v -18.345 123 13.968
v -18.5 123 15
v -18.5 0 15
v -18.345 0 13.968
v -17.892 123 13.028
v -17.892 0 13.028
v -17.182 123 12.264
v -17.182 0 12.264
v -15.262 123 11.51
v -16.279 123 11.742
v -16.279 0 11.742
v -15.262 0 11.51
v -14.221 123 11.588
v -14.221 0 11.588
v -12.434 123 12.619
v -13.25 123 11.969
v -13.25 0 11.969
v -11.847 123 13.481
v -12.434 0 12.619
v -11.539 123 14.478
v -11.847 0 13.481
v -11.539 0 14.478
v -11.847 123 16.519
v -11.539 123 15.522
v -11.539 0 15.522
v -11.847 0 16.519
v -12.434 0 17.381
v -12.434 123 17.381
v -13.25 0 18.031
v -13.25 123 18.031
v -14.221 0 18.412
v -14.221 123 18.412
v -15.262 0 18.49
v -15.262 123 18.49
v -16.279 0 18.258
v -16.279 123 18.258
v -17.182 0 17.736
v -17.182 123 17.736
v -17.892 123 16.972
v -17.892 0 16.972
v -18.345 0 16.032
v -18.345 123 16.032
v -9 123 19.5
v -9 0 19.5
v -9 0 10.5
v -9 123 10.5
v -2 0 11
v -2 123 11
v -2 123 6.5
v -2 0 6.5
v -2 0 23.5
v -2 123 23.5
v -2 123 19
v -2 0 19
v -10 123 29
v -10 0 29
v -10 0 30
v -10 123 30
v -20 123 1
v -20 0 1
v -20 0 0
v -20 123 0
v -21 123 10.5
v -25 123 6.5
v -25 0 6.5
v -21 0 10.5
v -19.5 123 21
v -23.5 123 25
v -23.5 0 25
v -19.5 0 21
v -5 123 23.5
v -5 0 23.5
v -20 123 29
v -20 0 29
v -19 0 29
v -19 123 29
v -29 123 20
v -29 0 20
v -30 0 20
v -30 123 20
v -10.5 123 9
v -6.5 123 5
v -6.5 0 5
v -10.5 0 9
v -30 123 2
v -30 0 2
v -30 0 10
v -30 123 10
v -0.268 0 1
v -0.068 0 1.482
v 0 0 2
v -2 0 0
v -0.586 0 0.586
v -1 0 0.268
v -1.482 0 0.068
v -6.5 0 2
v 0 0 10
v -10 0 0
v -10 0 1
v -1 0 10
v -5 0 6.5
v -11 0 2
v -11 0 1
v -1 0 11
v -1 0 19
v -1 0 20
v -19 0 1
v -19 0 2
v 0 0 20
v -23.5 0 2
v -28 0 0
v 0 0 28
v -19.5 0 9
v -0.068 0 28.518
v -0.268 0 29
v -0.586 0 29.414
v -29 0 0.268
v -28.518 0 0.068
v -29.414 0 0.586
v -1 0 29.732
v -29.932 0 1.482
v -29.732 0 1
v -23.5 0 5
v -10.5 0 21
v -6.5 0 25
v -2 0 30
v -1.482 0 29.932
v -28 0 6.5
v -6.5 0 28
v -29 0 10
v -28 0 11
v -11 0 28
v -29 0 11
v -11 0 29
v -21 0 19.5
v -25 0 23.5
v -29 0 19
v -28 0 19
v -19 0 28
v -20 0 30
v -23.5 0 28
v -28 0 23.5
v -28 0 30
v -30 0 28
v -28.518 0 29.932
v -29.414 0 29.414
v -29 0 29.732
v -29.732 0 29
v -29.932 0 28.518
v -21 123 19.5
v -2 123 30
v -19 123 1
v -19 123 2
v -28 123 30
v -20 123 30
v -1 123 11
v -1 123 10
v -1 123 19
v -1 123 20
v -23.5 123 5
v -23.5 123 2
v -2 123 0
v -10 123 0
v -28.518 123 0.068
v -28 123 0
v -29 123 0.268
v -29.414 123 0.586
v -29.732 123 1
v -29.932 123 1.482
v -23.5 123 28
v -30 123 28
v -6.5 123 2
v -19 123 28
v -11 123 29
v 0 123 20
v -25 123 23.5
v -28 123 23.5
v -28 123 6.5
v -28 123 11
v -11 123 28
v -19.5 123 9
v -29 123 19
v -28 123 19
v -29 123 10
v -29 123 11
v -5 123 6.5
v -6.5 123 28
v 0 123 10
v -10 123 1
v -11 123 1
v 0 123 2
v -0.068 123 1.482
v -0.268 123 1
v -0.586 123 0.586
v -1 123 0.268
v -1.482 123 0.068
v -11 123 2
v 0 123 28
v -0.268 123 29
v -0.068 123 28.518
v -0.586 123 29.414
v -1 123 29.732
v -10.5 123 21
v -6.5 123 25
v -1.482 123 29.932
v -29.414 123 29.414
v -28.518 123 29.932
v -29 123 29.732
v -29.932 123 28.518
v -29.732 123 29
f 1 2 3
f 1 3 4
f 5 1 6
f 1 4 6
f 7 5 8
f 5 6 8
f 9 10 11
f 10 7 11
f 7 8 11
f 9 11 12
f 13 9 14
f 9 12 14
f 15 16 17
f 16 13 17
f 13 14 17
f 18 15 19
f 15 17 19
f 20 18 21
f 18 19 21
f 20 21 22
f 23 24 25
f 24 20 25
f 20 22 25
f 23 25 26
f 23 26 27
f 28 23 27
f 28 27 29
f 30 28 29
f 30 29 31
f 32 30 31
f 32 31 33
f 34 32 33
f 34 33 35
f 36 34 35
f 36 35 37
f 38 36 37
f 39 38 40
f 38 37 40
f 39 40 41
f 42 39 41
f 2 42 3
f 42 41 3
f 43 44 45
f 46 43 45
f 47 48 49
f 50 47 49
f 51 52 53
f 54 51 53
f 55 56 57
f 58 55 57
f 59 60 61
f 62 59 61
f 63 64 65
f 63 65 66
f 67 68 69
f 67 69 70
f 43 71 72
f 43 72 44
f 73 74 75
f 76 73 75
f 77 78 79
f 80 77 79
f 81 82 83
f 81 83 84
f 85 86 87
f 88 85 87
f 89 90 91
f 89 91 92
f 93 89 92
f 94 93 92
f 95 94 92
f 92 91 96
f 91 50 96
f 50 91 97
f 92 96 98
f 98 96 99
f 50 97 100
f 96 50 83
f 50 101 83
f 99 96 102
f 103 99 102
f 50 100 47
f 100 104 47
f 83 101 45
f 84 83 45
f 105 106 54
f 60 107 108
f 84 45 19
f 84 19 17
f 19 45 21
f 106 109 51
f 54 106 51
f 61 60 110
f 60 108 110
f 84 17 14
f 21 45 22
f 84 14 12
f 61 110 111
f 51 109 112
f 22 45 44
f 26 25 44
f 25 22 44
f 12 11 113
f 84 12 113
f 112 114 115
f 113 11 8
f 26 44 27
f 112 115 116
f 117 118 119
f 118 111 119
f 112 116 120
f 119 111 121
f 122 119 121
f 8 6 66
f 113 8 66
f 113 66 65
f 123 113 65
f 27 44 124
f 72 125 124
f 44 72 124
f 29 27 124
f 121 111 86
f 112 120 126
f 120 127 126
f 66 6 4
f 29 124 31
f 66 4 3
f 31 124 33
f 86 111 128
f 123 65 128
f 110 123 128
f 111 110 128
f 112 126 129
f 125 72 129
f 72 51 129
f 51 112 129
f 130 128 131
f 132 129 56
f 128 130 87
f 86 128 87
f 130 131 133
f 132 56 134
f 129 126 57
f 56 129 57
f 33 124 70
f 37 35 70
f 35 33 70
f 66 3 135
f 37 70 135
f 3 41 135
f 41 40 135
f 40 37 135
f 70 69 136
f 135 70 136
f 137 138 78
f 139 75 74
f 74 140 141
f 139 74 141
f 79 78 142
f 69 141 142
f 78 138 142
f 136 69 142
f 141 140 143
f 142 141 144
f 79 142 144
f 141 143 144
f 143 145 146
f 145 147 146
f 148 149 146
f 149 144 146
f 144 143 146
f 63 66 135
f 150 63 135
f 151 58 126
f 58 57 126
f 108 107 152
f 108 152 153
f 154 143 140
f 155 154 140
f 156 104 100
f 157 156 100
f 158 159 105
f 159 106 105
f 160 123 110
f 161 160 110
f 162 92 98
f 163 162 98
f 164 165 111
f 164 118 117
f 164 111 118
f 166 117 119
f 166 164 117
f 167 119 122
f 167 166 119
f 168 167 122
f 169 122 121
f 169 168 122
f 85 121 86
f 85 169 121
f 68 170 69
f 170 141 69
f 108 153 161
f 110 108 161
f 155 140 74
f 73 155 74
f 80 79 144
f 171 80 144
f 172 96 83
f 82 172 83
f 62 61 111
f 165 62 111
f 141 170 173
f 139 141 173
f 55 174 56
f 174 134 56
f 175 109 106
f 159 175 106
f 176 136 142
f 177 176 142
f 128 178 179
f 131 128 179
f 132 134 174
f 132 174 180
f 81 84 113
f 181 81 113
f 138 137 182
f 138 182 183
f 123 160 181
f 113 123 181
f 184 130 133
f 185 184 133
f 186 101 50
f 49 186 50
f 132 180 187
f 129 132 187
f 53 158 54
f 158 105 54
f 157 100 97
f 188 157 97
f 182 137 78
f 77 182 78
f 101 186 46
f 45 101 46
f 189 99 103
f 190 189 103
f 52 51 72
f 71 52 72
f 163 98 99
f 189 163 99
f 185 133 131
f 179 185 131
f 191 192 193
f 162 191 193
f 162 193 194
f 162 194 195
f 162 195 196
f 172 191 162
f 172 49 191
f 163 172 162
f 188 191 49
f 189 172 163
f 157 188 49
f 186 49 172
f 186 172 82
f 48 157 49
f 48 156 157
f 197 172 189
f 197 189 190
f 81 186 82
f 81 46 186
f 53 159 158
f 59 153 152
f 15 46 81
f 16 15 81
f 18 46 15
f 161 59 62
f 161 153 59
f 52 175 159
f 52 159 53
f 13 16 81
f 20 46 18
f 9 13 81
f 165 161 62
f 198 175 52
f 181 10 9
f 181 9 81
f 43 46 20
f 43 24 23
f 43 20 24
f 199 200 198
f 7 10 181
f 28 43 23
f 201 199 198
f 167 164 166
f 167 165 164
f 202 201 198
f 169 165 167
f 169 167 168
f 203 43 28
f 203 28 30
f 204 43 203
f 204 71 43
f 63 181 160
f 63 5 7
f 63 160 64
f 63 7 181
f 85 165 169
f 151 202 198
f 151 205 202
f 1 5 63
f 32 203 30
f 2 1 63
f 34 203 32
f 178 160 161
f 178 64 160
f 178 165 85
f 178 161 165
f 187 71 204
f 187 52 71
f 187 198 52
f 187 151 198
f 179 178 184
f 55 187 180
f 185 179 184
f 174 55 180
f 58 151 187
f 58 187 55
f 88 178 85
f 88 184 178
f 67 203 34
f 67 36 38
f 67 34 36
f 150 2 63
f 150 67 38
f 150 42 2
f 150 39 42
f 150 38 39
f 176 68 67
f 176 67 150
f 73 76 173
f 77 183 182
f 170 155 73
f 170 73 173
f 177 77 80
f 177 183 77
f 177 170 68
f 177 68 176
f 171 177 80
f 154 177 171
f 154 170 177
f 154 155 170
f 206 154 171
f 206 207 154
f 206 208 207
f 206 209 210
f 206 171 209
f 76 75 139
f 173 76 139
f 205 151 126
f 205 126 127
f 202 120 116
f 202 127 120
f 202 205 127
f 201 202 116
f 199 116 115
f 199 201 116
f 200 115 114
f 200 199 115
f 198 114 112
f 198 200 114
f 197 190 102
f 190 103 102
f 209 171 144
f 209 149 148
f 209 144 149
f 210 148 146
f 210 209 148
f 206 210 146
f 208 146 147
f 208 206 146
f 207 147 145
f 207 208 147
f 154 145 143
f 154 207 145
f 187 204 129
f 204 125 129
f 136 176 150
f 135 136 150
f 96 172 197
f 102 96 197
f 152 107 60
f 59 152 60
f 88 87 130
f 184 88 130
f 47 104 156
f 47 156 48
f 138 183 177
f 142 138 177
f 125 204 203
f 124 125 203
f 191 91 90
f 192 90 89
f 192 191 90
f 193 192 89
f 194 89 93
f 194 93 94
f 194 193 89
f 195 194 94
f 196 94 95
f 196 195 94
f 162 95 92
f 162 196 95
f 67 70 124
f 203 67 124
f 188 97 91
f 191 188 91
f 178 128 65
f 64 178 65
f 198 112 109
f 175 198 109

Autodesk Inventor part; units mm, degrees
ref_plane "YZ Plane" through (0, 0, 0) normal (1, 0, 0) x (0, 1, 0)
ref_plane "XZ Plane" through (0, 0, 0) normal (0, 1, 0) x (-1, 0, 0)
ref_plane "XY Plane" through (0, 0, 0) normal (0, 0, 1) x (1, 0, 0)
sketch "Skizze2" plane through (0, 0, 0) normal (0, 1, 0) x (-1, 0, 0)
  line L0 (0, 0) -> (30, 0)
  line L1 (30, 0) -> (30, 30)
  line L2 (30, 30) -> (0, 30)
  line L3 (0, 30) -> (0, 0)
  line L4 (28, 28) -> (2, 28)
  line L5 (2, 28) -> (2, 2)
  line L6 (2, 2) -> (28, 2)
  line L7 (28, 2) -> (28, 28)
  line L8 (19, 30) -> (19, 28)
  line L9 (11, 30) -> (11, 28)
  line L10 (23.5, 28) -> (23.5, 25)
  line L11 (19.5, 21) -> (10.5, 21)
  line L12 (6.5, 25) -> (6.5, 28)
  line L13 (23.5, 25) -> (19.5, 21)
  line L14 (6.5, 25) -> (10.5, 21)
  line L15 (5, 6.5) -> (2, 6.5)
  line L16 (9, 19.5) -> (9, 10.5)
  line L17 (5, 23.5) -> (9, 19.5)
  line L18 (2, 23.5) -> (5, 23.5)
  line L19 (0, 19) -> (2, 19)
  line L20 (0, 11) -> (2, 11)
  line L21 (5, 6.5) -> (9, 10.5)
  line L22 (23.5, 5) -> (23.5, 2)
  line L23 (10.5, 9) -> (19.5, 9)
  line L24 (6.5, 5) -> (10.5, 9)
  line L25 (6.5, 2) -> (6.5, 5)
  line L26 (11, 0) -> (11, 2)
  line L27 (19, 0) -> (19, 2)
  line L28 (23.5, 5) -> (19.5, 9)
  line L29 (25, 23.5) -> (28, 23.5)
  line L30 (21, 10.5) -> (21, 19.5)
  line L31 (25, 6.5) -> (21, 10.5)
  line L32 (28, 6.5) -> (25, 6.5)
  line L33 (30, 11) -> (28, 11)
  line L34 (30, 19) -> (28, 19)
  line L35 (25, 23.5) -> (21, 19.5)
  circle A0 centre (15, 15) radius 3.5
  line L36 (20, 30) -> (20, 29)
  line L37 (20, 29) -> (19, 29)
  line L38 (11, 29) -> (10, 29)
  line L39 (10, 29) -> (10, 30)
  line L40 (1, 10) -> (0, 10)
  line L41 (1, 11) -> (1, 10)
  line L42 (1, 20) -> (1, 19)
  line L43 (0, 20) -> (1, 20)
  line L44 (20, 1) -> (20, 0)
  line L45 (19, 1) -> (20, 1)
  line L46 (10, 1) -> (11, 1)
  line L47 (10, 0) -> (10, 1)
  line L48 (29, 20) -> (30, 20)
  line L49 (29, 19) -> (29, 20)
  line L50 (29, 10) -> (29, 11)
  line L51 (30, 10) -> (29, 10)
  point P0 (23.5, 21)
  point P1 (6.5, 21)
  point P2 (9, 6.5)
  point P3 (9, 23.5)
  point P4 (23.5, 9)
  point P5 (6.5, 9)
  point P6 (21, 23.5)
  point P7 (21, 6.5)
  dimension "d23" = 30
  dimension "d24" = 30
  dimension "d25" = 2
  dimension "d26" = 2
  dimension "d27" = 2
  dimension "d28" = 2
  dimension "d29" = 8
  dimension "d30" = 11
  dimension "d32" = 6.5
  dimension "d33" = 17
  dimension "d34" = 9
  dimension "d35" = 4
  dimension "d36" = 4
  dimension "d37" = 4
  dimension "d38" = 4
  dimension "d39" = 15
  dimension "d40" = 15
  dimension "d43" = 360
  dimension "d45" = 7
  dimension "d46" = 1
  dimension "d47" = 1
  dimension "d48" = 1
  dimension "d49" = 1
  dimension "d52" = 360
extrude "Extrusion1" add sketch "Skizze2" along normal blind 123 contours L3 L40 L41 L20 L5 L6 L26 L46 L47 L0 | L44 L45 L27 L6 L7 L33 L50 L51 L1 L0 | L3 L2 L39 L38 L9 L4 L5 L19 L42 L43 | L6 L5 L15 L21 L16 L17 L18 L4 L12 L14 L11 L13 L10 L7 L29 L35 L30 L31 L32 L22 L28 L23 L24 L25 | L48 L49 L34 L7 L4 L8 L37 L36 L2 L1
fillet "Rundung1" radius 2 4 edges at (0, 61.5, 30) (0, 61.5, 0) (-30, 61.5, 0) (-30, 61.5, 30)
properties part number "ITEM_Profil"
